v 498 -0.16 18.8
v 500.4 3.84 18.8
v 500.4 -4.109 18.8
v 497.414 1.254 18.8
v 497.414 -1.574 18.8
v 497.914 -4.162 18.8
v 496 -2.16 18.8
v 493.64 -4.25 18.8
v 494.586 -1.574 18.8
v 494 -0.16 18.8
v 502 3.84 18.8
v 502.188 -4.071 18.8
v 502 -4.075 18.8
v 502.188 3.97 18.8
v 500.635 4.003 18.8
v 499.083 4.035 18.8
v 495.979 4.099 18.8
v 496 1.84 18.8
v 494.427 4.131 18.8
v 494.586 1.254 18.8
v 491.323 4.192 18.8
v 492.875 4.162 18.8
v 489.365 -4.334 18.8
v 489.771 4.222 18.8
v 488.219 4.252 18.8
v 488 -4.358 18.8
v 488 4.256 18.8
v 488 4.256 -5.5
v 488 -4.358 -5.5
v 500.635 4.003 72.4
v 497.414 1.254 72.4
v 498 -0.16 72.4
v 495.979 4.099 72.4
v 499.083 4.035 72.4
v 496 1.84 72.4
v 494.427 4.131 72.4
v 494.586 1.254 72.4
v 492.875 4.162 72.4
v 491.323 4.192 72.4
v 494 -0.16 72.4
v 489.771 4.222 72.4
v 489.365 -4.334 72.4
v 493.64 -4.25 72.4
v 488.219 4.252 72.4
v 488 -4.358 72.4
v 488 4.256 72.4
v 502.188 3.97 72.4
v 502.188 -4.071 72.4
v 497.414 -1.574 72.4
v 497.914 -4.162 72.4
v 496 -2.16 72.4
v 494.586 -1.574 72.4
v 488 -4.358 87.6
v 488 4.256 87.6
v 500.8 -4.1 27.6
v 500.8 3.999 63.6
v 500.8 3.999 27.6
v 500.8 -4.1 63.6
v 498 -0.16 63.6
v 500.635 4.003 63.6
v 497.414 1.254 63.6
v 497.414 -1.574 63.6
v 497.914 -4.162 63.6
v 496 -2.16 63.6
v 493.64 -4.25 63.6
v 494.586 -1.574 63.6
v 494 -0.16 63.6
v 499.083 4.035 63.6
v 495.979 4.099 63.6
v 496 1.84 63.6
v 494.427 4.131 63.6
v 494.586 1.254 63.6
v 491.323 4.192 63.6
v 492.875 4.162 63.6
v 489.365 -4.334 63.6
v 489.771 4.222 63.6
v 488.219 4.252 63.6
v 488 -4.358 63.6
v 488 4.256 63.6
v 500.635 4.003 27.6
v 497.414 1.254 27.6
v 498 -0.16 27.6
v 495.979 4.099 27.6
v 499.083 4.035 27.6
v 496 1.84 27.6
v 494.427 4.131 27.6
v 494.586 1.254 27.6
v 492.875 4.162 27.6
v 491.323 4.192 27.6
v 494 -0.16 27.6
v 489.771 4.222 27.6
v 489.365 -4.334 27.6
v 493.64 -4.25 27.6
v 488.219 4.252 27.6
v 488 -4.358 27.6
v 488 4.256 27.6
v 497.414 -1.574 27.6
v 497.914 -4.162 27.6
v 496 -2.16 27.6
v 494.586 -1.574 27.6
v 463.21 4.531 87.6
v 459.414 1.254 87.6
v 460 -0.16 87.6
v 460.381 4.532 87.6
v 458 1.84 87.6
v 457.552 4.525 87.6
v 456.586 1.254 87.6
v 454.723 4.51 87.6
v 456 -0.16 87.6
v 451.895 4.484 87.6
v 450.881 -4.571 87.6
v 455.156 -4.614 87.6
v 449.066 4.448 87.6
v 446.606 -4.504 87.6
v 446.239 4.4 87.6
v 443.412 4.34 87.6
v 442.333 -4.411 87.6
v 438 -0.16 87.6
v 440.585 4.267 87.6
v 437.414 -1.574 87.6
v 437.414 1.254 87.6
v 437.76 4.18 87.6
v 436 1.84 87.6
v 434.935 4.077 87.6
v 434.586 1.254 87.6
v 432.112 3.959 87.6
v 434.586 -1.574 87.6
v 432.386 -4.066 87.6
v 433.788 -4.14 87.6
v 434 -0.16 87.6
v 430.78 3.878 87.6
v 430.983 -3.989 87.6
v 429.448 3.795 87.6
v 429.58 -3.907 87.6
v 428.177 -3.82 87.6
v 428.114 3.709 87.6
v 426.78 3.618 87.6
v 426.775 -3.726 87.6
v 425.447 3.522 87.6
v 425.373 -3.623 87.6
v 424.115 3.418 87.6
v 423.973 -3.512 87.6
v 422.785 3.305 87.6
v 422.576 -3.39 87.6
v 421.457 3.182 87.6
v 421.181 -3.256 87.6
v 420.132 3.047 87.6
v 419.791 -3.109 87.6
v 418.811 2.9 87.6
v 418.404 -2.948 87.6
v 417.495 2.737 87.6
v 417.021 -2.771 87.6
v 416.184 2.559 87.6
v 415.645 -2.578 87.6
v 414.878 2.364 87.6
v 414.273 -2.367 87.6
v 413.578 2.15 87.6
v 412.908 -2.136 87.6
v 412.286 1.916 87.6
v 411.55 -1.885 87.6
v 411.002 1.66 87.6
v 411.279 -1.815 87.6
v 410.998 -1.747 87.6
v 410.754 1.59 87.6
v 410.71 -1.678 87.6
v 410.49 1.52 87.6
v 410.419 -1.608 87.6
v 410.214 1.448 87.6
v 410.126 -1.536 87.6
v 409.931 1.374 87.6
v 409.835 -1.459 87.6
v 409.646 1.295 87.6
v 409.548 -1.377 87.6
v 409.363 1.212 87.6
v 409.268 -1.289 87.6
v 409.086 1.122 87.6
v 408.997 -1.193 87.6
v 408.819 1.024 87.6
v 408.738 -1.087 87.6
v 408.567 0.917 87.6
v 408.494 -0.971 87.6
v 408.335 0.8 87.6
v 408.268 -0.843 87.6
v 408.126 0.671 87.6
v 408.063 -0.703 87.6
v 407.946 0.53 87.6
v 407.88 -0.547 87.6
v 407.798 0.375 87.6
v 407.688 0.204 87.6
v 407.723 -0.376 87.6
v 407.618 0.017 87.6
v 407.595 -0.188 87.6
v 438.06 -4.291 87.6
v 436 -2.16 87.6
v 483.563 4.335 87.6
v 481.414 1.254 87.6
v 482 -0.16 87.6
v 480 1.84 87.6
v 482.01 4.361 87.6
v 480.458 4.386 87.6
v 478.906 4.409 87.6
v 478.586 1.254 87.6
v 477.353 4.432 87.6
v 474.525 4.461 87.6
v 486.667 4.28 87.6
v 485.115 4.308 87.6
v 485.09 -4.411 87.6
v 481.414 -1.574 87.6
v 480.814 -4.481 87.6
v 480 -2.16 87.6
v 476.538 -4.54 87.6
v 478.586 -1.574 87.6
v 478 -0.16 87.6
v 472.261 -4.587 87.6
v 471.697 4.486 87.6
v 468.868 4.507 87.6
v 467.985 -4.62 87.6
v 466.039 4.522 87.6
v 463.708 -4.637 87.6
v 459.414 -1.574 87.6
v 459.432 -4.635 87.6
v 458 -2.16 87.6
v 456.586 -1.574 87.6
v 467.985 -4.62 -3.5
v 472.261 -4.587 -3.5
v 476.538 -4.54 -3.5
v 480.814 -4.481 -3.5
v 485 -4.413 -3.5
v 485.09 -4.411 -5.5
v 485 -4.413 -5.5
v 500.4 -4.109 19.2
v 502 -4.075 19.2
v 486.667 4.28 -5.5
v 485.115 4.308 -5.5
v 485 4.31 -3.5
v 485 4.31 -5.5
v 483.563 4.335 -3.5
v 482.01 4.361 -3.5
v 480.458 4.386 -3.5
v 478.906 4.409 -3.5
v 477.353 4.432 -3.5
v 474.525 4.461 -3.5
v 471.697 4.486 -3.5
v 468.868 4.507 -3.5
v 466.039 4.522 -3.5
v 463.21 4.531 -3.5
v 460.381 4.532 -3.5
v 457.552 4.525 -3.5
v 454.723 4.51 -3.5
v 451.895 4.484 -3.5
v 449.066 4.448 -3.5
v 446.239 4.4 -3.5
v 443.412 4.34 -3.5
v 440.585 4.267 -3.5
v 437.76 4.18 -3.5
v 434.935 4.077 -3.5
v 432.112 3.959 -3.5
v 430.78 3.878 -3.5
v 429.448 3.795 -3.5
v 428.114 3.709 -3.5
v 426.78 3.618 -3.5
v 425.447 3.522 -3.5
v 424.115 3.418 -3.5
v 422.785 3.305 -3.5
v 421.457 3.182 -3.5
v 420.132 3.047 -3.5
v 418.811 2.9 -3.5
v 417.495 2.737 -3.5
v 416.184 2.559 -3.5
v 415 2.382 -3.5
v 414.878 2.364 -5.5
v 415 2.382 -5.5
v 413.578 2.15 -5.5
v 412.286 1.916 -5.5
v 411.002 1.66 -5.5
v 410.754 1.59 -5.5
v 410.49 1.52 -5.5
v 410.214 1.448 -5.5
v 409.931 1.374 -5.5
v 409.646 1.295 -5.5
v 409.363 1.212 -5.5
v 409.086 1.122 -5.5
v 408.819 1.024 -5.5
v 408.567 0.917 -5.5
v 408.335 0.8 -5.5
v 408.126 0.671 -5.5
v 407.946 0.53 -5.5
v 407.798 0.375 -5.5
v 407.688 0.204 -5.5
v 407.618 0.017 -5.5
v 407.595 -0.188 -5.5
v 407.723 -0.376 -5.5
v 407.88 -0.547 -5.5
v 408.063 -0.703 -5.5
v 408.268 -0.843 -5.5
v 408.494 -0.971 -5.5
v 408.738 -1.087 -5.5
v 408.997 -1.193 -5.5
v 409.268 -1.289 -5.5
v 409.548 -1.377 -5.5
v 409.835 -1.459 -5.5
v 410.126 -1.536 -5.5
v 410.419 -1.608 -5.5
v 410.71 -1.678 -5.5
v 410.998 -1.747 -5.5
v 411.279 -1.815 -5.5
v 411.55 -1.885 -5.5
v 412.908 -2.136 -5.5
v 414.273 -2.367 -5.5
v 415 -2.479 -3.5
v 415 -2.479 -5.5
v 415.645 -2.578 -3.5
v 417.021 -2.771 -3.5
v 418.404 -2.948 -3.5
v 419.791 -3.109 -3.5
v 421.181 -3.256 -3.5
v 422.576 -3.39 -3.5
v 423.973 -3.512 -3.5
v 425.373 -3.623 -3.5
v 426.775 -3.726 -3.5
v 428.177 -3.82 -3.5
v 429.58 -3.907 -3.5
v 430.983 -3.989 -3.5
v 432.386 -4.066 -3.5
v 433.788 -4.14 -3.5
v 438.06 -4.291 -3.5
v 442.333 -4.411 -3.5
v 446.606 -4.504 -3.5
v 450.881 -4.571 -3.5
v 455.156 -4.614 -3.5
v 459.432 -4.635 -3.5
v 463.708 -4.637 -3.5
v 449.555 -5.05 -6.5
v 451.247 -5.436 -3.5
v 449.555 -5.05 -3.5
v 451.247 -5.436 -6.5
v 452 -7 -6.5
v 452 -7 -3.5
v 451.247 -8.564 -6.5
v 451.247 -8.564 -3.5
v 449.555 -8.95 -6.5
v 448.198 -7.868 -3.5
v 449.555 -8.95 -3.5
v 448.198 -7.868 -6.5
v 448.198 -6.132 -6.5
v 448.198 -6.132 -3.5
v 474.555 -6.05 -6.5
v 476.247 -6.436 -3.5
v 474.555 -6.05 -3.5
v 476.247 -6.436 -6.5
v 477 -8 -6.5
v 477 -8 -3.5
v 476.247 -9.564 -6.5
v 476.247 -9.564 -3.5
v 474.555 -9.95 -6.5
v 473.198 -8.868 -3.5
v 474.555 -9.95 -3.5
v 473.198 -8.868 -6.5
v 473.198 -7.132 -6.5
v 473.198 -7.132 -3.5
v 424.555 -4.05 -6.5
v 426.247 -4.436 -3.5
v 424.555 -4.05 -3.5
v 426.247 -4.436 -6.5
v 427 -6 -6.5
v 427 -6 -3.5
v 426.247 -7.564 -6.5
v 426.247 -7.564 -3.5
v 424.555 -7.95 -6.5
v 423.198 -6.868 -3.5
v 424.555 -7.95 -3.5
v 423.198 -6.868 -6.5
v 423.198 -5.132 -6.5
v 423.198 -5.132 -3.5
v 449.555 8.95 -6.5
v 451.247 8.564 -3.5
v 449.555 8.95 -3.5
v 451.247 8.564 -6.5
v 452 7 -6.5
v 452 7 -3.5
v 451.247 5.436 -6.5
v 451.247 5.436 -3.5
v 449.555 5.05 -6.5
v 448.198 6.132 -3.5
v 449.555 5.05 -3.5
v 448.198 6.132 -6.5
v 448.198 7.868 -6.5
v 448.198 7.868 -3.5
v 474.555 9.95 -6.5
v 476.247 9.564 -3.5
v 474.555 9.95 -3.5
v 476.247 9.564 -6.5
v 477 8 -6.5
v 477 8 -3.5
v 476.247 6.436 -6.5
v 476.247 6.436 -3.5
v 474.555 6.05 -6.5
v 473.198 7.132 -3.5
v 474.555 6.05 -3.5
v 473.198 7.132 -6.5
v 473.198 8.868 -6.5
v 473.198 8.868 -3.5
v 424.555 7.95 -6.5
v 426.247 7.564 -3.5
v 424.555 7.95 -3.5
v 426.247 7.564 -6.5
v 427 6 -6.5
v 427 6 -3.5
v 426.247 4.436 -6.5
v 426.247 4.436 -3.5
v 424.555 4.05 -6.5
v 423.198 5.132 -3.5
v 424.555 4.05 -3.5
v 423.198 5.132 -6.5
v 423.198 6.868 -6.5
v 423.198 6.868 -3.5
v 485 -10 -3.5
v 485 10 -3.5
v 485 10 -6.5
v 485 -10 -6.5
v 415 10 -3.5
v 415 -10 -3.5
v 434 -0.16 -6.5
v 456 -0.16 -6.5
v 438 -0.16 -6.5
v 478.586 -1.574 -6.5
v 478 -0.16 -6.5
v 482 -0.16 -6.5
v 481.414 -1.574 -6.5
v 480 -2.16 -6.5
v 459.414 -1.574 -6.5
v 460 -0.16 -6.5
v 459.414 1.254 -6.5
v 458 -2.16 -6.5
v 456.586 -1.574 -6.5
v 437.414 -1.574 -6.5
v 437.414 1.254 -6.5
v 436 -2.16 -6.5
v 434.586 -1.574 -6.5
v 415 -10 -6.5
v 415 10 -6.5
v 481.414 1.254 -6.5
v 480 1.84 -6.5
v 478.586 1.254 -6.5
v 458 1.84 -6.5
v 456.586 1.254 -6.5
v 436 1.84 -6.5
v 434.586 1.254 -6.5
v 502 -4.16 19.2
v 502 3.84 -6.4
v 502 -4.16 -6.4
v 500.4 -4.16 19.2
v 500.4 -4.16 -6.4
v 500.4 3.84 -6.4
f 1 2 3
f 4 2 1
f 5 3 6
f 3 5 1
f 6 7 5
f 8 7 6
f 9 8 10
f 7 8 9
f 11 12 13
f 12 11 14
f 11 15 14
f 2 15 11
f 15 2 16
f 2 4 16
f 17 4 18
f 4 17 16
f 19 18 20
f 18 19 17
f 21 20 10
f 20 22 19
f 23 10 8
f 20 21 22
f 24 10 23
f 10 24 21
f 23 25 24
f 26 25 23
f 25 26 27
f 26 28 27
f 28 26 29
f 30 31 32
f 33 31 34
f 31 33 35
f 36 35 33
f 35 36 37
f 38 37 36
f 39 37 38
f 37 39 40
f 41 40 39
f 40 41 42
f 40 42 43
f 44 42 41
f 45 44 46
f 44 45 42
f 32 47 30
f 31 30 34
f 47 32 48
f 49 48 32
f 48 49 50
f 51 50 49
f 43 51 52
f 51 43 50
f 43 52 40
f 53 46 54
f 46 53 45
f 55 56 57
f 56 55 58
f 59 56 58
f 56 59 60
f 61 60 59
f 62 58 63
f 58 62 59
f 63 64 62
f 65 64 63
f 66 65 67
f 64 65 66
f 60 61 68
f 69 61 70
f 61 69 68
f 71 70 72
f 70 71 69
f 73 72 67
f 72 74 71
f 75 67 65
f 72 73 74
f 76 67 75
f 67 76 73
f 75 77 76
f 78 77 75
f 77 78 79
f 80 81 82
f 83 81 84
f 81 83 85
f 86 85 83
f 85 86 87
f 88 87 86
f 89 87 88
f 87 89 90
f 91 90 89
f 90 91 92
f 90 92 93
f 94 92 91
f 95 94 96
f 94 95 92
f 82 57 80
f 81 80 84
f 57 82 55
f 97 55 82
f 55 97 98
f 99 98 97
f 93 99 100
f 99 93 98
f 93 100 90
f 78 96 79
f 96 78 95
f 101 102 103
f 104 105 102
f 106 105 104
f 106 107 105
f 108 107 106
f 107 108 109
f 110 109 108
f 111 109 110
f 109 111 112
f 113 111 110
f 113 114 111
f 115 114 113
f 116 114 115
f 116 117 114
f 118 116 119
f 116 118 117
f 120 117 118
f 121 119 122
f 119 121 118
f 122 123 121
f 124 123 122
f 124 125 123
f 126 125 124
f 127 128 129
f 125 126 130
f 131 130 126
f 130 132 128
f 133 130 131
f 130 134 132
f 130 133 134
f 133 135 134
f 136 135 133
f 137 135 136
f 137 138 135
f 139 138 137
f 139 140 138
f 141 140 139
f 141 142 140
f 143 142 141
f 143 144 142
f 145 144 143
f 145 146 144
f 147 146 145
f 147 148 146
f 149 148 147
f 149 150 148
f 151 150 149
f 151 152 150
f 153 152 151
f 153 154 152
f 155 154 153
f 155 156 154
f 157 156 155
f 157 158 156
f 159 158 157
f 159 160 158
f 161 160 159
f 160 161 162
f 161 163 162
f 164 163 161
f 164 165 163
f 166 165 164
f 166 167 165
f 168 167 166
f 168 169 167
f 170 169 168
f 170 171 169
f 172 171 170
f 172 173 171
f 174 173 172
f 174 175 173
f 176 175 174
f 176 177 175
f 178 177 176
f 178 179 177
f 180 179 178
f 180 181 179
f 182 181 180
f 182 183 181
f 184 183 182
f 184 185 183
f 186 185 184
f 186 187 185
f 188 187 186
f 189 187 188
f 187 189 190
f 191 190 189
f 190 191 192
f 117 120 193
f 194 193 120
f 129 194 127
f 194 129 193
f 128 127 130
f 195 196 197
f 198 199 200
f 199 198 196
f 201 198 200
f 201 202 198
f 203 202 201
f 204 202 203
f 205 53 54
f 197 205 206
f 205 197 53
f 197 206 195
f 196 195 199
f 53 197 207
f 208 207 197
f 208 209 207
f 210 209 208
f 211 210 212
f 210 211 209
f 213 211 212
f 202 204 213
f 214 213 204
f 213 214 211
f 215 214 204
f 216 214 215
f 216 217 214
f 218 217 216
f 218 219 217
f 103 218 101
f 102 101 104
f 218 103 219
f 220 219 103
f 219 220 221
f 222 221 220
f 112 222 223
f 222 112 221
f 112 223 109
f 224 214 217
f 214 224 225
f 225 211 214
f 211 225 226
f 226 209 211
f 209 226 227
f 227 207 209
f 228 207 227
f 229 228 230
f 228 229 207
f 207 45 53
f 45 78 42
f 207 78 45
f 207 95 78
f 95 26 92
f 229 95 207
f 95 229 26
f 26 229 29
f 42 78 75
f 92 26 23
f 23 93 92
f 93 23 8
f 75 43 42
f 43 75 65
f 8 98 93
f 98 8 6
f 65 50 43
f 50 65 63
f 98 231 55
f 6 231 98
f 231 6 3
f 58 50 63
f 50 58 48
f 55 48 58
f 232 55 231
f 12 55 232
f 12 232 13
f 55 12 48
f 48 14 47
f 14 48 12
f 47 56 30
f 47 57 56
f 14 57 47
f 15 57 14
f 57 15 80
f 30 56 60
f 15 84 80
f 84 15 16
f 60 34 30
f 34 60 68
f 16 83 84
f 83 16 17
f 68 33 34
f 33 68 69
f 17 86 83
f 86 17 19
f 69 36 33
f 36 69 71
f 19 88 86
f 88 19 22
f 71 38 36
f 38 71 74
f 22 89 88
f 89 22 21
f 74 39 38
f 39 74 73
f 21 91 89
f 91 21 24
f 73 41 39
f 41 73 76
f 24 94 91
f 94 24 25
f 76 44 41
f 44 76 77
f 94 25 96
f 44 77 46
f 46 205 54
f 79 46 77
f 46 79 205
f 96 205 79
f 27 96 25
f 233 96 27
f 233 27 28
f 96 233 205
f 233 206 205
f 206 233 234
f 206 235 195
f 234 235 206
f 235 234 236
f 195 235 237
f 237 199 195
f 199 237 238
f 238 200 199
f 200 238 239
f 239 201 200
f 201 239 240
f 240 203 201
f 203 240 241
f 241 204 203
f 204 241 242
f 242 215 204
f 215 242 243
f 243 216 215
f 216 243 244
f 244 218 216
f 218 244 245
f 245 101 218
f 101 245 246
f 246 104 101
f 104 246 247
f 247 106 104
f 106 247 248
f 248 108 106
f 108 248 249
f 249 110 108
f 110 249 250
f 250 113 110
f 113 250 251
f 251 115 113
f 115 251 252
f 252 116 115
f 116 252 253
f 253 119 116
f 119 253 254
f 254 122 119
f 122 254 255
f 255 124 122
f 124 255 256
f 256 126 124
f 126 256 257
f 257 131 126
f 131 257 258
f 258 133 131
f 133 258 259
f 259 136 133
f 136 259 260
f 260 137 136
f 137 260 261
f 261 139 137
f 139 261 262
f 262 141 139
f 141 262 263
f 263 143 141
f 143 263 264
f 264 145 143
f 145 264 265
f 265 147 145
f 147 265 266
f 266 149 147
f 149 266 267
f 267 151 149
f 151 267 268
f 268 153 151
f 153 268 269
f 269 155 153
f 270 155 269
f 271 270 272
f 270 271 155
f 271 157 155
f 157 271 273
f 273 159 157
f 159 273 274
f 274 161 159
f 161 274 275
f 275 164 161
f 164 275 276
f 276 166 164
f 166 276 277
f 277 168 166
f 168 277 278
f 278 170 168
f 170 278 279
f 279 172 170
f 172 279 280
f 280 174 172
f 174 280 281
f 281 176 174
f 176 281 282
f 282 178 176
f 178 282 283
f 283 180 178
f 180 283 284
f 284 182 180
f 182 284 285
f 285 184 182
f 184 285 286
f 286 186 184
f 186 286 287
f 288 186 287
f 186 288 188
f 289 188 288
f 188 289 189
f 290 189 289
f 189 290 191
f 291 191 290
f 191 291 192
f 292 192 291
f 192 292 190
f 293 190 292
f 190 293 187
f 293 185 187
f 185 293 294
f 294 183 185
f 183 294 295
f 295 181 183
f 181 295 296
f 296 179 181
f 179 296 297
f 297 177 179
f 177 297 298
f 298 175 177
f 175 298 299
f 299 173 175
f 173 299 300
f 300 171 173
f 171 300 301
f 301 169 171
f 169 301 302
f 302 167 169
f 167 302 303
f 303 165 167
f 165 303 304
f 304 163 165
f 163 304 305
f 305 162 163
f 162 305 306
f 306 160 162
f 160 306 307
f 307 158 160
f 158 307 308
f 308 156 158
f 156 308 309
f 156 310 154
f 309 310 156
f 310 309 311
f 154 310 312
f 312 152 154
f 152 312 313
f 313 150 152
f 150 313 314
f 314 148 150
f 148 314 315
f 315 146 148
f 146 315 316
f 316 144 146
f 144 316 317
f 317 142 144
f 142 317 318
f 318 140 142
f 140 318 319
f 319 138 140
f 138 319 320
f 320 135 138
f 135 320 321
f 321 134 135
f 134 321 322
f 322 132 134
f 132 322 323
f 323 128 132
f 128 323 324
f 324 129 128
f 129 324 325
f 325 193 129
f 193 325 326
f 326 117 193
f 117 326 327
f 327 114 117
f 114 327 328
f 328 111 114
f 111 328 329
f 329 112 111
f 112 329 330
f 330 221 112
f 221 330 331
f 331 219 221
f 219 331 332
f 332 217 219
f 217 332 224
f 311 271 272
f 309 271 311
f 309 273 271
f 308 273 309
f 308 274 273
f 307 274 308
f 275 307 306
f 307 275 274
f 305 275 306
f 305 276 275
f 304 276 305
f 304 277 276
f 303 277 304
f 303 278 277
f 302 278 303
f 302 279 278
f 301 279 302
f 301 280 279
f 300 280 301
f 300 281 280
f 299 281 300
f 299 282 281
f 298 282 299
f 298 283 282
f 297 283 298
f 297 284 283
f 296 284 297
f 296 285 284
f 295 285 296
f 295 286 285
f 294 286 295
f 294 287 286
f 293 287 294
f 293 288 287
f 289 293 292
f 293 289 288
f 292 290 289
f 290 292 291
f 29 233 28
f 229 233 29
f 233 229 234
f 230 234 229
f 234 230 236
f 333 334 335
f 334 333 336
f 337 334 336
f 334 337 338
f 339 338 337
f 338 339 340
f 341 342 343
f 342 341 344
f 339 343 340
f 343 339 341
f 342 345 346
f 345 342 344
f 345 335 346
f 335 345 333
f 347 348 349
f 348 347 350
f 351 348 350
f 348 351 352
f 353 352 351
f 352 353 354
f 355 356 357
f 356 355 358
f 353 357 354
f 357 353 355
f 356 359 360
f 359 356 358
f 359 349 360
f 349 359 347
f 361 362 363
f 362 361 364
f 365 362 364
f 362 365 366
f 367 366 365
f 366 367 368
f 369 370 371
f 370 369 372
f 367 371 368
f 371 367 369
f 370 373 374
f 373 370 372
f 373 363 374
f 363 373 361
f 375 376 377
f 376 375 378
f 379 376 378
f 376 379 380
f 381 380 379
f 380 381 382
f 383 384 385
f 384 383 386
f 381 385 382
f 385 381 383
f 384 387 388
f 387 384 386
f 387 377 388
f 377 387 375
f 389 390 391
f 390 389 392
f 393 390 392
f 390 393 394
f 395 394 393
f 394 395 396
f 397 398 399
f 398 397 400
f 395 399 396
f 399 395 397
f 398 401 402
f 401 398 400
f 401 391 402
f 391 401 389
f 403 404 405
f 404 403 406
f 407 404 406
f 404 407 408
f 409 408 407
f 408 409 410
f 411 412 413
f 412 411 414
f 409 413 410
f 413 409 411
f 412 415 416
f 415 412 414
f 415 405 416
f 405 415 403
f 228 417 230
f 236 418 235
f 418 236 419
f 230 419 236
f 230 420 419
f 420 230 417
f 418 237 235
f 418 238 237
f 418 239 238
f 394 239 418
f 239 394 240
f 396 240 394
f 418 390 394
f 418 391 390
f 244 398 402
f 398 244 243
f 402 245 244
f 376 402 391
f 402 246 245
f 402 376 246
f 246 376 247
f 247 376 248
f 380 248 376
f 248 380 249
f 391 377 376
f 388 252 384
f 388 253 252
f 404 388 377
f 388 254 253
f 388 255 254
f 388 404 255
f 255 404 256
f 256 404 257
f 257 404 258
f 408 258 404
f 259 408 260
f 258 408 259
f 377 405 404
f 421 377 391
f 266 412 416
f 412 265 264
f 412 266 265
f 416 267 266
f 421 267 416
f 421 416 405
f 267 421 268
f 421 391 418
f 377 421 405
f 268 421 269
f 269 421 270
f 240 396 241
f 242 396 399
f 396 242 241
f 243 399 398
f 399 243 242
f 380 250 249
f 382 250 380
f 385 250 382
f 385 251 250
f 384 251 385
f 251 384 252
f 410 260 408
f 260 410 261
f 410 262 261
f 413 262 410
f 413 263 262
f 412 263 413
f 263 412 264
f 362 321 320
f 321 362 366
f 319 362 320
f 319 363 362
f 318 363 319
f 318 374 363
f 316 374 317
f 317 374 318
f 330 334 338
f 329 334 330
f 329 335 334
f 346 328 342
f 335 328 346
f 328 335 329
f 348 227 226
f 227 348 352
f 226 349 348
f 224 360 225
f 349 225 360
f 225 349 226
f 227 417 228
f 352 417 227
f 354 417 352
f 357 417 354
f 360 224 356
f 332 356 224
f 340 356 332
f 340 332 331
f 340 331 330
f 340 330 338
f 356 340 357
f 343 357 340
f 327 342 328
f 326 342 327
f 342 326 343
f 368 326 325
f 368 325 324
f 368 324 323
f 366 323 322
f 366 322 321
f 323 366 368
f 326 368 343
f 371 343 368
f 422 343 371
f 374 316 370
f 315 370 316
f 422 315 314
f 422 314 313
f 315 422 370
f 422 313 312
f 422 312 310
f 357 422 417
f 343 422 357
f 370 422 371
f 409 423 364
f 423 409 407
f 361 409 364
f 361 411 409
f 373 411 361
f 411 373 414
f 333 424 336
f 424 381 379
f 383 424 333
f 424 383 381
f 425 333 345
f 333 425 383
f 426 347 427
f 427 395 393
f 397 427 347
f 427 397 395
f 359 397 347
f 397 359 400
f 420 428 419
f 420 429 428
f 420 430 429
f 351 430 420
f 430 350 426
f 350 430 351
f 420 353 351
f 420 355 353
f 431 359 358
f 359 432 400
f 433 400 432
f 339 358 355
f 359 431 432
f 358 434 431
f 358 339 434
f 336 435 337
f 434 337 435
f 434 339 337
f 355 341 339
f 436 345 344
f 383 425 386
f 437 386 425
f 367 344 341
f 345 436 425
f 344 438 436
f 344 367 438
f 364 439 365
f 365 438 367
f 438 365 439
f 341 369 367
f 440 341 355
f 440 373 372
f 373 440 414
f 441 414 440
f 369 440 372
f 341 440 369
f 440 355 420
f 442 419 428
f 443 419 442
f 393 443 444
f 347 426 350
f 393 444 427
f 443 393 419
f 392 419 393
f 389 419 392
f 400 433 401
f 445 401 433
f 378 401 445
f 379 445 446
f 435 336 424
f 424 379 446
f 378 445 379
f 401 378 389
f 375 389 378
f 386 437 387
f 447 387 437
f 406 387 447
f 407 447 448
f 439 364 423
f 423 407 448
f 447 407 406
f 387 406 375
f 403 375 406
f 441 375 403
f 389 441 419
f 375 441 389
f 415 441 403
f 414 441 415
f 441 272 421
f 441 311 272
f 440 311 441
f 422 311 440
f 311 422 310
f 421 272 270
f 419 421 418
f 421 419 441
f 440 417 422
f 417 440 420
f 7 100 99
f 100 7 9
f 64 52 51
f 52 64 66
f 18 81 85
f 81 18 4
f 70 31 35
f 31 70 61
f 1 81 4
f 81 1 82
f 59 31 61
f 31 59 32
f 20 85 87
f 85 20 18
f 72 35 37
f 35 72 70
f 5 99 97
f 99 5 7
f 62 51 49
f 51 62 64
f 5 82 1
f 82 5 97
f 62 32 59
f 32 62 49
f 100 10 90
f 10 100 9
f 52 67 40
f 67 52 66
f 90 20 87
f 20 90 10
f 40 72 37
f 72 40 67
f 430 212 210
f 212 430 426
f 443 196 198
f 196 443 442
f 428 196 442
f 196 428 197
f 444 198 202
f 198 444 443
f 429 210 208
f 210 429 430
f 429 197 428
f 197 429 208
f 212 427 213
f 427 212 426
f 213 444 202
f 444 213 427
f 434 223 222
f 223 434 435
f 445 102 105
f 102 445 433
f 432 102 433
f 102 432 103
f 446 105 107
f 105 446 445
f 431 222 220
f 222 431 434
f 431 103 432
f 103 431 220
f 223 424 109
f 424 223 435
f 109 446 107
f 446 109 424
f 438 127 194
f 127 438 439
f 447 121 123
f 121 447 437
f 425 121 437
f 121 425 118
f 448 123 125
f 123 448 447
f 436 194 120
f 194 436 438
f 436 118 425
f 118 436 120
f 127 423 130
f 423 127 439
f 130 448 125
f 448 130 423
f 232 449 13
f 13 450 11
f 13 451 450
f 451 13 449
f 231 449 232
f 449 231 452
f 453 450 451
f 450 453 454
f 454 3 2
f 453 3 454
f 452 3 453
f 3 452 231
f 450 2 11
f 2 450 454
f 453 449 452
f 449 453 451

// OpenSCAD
// file: tail.scad
module tail_up_front(){
  translate([0,0,2]){
    difference(){
      union(){
        scale(0.8) translate([500,-65.2,-13]){
          difference(){
            translate([0,-22,0]) scale([0.6,0.4,0.6])
              linear_extrude(file = "tail/front.dxf",height = 200, convexity = 10);
            union(){
              translate([110,60-5,-1])
              cube([36,70+5,20+15]);
              translate([110,60-5,101])
              cube([36,70+5,20]);
              translate([110,60-5,30+15])
              cube([16,70+5,60-15]);
            }
          }
        }
      }
      translate([400,-100,-7.5-300])cube(300);
    }
    translate([0,0,3])tail_upper_socket();
  }
}

module tail_front(){
difference(){
  union(){
    scale(0.8) translate([500,-65.2,-13]){
      difference(){
        translate([0,-22,0]) scale([0.6,0.4,0.6])
          linear_extrude(file = "tail/front.dxf",height = 200, convexity = 10);
        union(){
          translate([110,60-5,-1])
          cube([36,70+5,20+15]);
          translate([110,60-5,101])
          cube([36,70+5,20]);
          translate([110,60-5,30+15])
          cube([16,70+5,60-15]);
        }
      }
    }
  }
  translate([400,-100,-7.501])cube(300);
}

}

module tail_back(){
  scale(0.8) translate([500,-65.2,-13]) {
  difference(){
  scale([0.6,0.3,0.6])
  scale([0.6,1,1])
  translate([120,0,0])
  linear_extrude(file = "tail/back.dxf",height = 200, convexity = 10);
  union(){
    translate([110,60,18+15])
    cube([22,70,120-36-15]);
    translate([110,0,0]) rotate([0,45+14,0]) cube([100,297,300]);
    translate([110,0,-1-5+3]) cube([60,297,11]);
  }
  }
  }

}

module tail_rod(){
      translate([110, 0, -12])rotate([0,90,0])cylinder(r=3.7,h=370);
}

module tail_unstranlated(){
difference(){
union(){
  tail_front();
  tail_back();
}
    translate([120,65,-1])
cylinder(r=2,h=200);

}
}

module tail(){
  difference(){
    tail_unstranlated();
    tail_rod();
  }
}

module tail_socket(){
  difference(){
    translate([450,0,-10]) cube([70,20,5],center=true);
    union(){
      tail_rod();
      translate([450,-7,-100]) cylinder(r=2,h=400);
      translate([475,-8,-100]) cylinder(r=2,h=400);
      translate([425,-6,-100]) cylinder(r=2,h=400);
      translate([450,7,-100]) cylinder(r=2,h=400);
      translate([475,8,-100]) cylinder(r=2,h=400);
      translate([425,6,-100]) cylinder(r=2,h=400);
    }
  }
}

module tail_upper_socket(){
  difference(){
    translate([450,0,-10]) cube([70,20,3],center=true);
    union(){
      translate([450,-7,-100]) cylinder(r=2,h=400);
     translate([475,-8,-100]) cylinder(r=2,h=400);
     translate([425,-6,-100]) cylinder(r=2,h=400);
     translate([450,7,-100]) cylinder(r=2,h=400);
     translate([475,8,-100]) cylinder(r=2,h=400);
     translate([425,6,-100]) cylinder(r=2,h=400);
    }
  }
}

module tail_socket_bottom(){
  back_wheel();
  difference(){
    translate([450,0,-19]) cube([70,20,3],center=true);
    union(){
      tail_rod();
      translate([450,-7,-100]) cylinder(r=2,h=400);
     translate([475,-8,-100]) cylinder(r=2,h=400);
     translate([425,-6,-100]) cylinder(r=2,h=400);
     translate([450,7,-100]) cylinder(r=2,h=400);
     translate([475,8,-100]) cylinder(r=2,h=400);
     translate([425,6,-100]) cylinder(r=2,h=400);
    }
  }
}

module back_wheel(){
difference(){
 translate([470,0,-28]) cube([20,6,20],center=true);
 translate([470-10,-6+12,-28-20]) rotate([0,45,0]) cube([40,40,40],center=true);
}
}

module elevator_fixed(){
difference(){
  union(){
    translate([500*0.8,48/0.7,-66]) rotate([90,0,0])
    scale([0.48,0.24,0.7]) linear_extrude(file = "tail/front.dxf",height = 200, convexity = 10);
  }
  union(){
    tail_rod();
      translate([450,-7,-100]) cylinder(r=2,h=400);
     translate([475,-8,-100]) cylinder(r=2,h=400);
     translate([425,-6,-100]) cylinder(r=2,h=400);
     translate([450,7,-100]) cylinder(r=2,h=400);
     translate([475,8,-100]) cylinder(r=2,h=400);
     translate([425,6,-100]) cylinder(r=2,h=400);
    translate([150,-200,-17-5/2]) cube([1000,1000,5]);
    translate([490,-60,-100]) cube([50,117,300]);
    translate([497,200,-12.5]) rotate([90,0,0]) cylinder(r=1,h=400);
  }
}
}

module elevator(){
  difference(){
    difference(){
      translate([500*0.8-3+35,48/0.7,-66]) rotate([90,0,0]) scale([0.3,0.24,0.7])
      linear_extrude(file = "tail/back.dxf",height = 200, convexity = 10);
      union(){
        translate([150,-200,-17-5/2]) cube([1000,1000,5]);
        translate([490,-90,-100]) cube([16,31,300]);
        translate([490,-60+117+1-2,-100]) cube([16,297,300]);
      }
  }
    translate([497,200,-12.5]) rotate([90,0,0]) cylinder(r=1,h=400);
  }
  
}

module tail_full(){
  tail();
  tail_up_front();
  tail_rod();
  tail_socket();
  tail_socket_bottom();
  elevator_fixed();
  elevator();
}


tail_full();
// main file
use <tail.scad>;

difference(){
  difference(){

    difference(){
      tail_up_front();
      union(){
        scale(0.8) translate([500,-65.2,-13]){
        translate([120,65,-1]) cylinder(r=2.5,h=200);
        translate([100,65,-1]) cylinder(r=2.5,h=200);
        translate([72.5,65,-1]) cylinder(r=2.5,h=200);
        translate([45,65,-1]) cylinder(r=2.5,h=200);
}

      }
    }
    tail_rod();
  }
}

//tail_socket();


//elevator_fixed();

        scale(0.8) translate([500,-65.2,-13])
translate([126.5,65,21])cube([2,10,32],center=true);
